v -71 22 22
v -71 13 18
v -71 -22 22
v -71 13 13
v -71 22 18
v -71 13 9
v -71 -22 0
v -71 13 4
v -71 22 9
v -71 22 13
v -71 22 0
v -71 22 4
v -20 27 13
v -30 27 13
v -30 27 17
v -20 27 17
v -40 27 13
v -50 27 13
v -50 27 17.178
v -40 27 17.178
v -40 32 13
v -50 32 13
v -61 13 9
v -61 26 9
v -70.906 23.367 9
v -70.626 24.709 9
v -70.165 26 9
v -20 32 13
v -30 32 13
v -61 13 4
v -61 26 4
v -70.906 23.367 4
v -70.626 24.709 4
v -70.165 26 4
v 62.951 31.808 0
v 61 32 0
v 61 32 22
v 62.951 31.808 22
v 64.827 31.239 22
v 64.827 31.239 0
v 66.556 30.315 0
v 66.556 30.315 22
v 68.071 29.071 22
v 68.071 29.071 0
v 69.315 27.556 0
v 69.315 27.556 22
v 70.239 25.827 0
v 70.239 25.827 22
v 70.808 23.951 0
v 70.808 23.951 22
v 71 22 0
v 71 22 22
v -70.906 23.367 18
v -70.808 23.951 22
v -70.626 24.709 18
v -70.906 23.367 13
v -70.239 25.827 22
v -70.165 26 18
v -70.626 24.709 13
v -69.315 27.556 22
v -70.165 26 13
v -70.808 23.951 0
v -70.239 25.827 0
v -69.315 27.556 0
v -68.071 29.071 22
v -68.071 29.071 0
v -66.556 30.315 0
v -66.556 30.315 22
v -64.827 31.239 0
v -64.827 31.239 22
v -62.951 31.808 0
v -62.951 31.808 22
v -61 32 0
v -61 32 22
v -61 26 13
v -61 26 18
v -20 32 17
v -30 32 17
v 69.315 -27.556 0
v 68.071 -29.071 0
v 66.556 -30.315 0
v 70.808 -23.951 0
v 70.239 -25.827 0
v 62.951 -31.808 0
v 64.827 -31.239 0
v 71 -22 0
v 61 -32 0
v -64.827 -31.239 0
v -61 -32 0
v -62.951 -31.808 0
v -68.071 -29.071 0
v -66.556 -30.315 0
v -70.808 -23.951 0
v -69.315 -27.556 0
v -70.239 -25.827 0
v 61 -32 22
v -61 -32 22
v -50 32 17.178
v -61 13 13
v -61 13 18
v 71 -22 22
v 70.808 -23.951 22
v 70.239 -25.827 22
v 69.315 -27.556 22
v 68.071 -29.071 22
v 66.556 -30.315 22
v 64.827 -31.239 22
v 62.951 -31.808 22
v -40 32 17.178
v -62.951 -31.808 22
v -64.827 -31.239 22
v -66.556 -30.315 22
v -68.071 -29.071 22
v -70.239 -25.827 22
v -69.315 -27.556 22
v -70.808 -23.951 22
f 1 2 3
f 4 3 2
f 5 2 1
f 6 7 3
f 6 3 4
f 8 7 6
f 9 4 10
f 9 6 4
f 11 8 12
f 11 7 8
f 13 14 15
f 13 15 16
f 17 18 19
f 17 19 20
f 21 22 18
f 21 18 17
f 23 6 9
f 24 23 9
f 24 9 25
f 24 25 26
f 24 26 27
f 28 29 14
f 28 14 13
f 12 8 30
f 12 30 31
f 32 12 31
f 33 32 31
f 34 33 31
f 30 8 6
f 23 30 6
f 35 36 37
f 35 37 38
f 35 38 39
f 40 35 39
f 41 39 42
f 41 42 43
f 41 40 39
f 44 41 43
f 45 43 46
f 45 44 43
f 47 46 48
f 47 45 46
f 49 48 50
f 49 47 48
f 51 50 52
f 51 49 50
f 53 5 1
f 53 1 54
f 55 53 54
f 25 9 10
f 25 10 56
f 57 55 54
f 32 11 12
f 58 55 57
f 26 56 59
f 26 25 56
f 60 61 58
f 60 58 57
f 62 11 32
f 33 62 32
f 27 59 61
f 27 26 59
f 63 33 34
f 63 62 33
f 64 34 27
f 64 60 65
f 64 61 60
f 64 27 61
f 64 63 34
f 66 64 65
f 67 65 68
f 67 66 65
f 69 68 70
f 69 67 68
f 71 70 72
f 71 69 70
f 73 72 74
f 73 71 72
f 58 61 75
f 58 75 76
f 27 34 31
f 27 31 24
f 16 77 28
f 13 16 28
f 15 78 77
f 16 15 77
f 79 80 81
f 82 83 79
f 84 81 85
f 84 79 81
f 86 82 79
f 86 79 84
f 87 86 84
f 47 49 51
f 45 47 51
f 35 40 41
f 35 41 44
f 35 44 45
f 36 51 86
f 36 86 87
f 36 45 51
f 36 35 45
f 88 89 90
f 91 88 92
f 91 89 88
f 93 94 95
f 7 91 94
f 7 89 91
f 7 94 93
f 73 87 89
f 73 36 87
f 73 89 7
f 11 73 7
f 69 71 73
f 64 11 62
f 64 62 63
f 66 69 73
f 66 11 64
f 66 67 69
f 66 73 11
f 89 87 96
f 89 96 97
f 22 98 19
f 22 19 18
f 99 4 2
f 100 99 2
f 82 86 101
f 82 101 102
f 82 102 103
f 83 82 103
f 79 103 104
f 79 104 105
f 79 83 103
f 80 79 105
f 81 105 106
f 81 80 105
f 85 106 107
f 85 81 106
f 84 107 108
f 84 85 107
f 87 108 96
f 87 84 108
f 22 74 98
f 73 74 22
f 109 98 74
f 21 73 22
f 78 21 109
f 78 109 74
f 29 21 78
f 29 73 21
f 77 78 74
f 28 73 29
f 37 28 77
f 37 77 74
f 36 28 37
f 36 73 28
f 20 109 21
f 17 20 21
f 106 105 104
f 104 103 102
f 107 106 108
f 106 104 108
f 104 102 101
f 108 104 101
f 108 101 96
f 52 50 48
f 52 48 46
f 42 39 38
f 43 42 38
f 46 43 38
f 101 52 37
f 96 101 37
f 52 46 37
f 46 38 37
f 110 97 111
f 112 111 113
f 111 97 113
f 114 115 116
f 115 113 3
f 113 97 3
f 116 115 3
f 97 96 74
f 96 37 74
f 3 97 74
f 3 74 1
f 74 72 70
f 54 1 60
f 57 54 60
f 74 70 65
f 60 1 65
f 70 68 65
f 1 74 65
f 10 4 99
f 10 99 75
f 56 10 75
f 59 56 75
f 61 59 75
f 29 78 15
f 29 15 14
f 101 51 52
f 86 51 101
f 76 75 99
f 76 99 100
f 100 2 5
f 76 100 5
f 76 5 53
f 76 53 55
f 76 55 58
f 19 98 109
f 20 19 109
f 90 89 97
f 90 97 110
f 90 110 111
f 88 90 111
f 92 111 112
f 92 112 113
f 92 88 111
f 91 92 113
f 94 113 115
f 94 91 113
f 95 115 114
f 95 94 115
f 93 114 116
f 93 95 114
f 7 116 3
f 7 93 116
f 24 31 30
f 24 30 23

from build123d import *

# Parameters (mm, degrees)
BOSS_EXTRUDE1_DEPTH = 22
SKETCH2_W           = 5
SKETCH2_H           = 13
CUT_EXTRUDE1_DEPTH  = 10
SKETCH3_W           = 10
SKETCH3_H           = 4
SKETCH3_H_2         = 4.178443519
CUT_EXTRUDE2_DEPTH  = 5


with BuildPart() as part:
    # Sketch1 → Boss-Extrude1 (new body)
    with BuildSketch(Plane.XY):
        with BuildLine():
            Line((-61, 32), (61, 32))
            ThreePointArc((61, 32), (68.071067812, 29.071067812), (71, 22))
            Line((71, 22), (71, -22))
            ThreePointArc((71, -22), (68.071067812, -29.071067812), (61, -32))
            Line((61, -32), (-61, -32))
            ThreePointArc((-61, -32), (-68.071067812, -29.071067812), (-71, -22))
            Line((-71, -22), (-71, 22))
            ThreePointArc((-71, 22), (-68.071067812, 29.071067812), (-61, 32))
        make_face()
    extrude(amount=BOSS_EXTRUDE1_DEPTH)

    # Sketch2 → Cut-Extrude1 (cut)
    with BuildSketch(Plane.ZY.offset(71)):
        with Locations((15.5, 19.5)):
            Rectangle(SKETCH2_W, SKETCH2_H)
        with Locations((6.5, 19.5)):
            Rectangle(SKETCH2_W, SKETCH2_H)
    extrude(amount=-CUT_EXTRUDE1_DEPTH, mode=Mode.SUBTRACT)

    # Sketch3 → Cut-Extrude2 (cut)
    with BuildSketch(Plane(origin=(0, 32, 0), x_dir=(1, 0, 0), z_dir=(0, 1, 0))):
        with Locations((-25, -15)):
            Rectangle(SKETCH3_W, SKETCH3_H)
        with Locations((-45, -15.08922176)):
            Rectangle(SKETCH3_W, SKETCH3_H_2)
    extrude(amount=-CUT_EXTRUDE2_DEPTH, mode=Mode.SUBTRACT)


solid = part.part
